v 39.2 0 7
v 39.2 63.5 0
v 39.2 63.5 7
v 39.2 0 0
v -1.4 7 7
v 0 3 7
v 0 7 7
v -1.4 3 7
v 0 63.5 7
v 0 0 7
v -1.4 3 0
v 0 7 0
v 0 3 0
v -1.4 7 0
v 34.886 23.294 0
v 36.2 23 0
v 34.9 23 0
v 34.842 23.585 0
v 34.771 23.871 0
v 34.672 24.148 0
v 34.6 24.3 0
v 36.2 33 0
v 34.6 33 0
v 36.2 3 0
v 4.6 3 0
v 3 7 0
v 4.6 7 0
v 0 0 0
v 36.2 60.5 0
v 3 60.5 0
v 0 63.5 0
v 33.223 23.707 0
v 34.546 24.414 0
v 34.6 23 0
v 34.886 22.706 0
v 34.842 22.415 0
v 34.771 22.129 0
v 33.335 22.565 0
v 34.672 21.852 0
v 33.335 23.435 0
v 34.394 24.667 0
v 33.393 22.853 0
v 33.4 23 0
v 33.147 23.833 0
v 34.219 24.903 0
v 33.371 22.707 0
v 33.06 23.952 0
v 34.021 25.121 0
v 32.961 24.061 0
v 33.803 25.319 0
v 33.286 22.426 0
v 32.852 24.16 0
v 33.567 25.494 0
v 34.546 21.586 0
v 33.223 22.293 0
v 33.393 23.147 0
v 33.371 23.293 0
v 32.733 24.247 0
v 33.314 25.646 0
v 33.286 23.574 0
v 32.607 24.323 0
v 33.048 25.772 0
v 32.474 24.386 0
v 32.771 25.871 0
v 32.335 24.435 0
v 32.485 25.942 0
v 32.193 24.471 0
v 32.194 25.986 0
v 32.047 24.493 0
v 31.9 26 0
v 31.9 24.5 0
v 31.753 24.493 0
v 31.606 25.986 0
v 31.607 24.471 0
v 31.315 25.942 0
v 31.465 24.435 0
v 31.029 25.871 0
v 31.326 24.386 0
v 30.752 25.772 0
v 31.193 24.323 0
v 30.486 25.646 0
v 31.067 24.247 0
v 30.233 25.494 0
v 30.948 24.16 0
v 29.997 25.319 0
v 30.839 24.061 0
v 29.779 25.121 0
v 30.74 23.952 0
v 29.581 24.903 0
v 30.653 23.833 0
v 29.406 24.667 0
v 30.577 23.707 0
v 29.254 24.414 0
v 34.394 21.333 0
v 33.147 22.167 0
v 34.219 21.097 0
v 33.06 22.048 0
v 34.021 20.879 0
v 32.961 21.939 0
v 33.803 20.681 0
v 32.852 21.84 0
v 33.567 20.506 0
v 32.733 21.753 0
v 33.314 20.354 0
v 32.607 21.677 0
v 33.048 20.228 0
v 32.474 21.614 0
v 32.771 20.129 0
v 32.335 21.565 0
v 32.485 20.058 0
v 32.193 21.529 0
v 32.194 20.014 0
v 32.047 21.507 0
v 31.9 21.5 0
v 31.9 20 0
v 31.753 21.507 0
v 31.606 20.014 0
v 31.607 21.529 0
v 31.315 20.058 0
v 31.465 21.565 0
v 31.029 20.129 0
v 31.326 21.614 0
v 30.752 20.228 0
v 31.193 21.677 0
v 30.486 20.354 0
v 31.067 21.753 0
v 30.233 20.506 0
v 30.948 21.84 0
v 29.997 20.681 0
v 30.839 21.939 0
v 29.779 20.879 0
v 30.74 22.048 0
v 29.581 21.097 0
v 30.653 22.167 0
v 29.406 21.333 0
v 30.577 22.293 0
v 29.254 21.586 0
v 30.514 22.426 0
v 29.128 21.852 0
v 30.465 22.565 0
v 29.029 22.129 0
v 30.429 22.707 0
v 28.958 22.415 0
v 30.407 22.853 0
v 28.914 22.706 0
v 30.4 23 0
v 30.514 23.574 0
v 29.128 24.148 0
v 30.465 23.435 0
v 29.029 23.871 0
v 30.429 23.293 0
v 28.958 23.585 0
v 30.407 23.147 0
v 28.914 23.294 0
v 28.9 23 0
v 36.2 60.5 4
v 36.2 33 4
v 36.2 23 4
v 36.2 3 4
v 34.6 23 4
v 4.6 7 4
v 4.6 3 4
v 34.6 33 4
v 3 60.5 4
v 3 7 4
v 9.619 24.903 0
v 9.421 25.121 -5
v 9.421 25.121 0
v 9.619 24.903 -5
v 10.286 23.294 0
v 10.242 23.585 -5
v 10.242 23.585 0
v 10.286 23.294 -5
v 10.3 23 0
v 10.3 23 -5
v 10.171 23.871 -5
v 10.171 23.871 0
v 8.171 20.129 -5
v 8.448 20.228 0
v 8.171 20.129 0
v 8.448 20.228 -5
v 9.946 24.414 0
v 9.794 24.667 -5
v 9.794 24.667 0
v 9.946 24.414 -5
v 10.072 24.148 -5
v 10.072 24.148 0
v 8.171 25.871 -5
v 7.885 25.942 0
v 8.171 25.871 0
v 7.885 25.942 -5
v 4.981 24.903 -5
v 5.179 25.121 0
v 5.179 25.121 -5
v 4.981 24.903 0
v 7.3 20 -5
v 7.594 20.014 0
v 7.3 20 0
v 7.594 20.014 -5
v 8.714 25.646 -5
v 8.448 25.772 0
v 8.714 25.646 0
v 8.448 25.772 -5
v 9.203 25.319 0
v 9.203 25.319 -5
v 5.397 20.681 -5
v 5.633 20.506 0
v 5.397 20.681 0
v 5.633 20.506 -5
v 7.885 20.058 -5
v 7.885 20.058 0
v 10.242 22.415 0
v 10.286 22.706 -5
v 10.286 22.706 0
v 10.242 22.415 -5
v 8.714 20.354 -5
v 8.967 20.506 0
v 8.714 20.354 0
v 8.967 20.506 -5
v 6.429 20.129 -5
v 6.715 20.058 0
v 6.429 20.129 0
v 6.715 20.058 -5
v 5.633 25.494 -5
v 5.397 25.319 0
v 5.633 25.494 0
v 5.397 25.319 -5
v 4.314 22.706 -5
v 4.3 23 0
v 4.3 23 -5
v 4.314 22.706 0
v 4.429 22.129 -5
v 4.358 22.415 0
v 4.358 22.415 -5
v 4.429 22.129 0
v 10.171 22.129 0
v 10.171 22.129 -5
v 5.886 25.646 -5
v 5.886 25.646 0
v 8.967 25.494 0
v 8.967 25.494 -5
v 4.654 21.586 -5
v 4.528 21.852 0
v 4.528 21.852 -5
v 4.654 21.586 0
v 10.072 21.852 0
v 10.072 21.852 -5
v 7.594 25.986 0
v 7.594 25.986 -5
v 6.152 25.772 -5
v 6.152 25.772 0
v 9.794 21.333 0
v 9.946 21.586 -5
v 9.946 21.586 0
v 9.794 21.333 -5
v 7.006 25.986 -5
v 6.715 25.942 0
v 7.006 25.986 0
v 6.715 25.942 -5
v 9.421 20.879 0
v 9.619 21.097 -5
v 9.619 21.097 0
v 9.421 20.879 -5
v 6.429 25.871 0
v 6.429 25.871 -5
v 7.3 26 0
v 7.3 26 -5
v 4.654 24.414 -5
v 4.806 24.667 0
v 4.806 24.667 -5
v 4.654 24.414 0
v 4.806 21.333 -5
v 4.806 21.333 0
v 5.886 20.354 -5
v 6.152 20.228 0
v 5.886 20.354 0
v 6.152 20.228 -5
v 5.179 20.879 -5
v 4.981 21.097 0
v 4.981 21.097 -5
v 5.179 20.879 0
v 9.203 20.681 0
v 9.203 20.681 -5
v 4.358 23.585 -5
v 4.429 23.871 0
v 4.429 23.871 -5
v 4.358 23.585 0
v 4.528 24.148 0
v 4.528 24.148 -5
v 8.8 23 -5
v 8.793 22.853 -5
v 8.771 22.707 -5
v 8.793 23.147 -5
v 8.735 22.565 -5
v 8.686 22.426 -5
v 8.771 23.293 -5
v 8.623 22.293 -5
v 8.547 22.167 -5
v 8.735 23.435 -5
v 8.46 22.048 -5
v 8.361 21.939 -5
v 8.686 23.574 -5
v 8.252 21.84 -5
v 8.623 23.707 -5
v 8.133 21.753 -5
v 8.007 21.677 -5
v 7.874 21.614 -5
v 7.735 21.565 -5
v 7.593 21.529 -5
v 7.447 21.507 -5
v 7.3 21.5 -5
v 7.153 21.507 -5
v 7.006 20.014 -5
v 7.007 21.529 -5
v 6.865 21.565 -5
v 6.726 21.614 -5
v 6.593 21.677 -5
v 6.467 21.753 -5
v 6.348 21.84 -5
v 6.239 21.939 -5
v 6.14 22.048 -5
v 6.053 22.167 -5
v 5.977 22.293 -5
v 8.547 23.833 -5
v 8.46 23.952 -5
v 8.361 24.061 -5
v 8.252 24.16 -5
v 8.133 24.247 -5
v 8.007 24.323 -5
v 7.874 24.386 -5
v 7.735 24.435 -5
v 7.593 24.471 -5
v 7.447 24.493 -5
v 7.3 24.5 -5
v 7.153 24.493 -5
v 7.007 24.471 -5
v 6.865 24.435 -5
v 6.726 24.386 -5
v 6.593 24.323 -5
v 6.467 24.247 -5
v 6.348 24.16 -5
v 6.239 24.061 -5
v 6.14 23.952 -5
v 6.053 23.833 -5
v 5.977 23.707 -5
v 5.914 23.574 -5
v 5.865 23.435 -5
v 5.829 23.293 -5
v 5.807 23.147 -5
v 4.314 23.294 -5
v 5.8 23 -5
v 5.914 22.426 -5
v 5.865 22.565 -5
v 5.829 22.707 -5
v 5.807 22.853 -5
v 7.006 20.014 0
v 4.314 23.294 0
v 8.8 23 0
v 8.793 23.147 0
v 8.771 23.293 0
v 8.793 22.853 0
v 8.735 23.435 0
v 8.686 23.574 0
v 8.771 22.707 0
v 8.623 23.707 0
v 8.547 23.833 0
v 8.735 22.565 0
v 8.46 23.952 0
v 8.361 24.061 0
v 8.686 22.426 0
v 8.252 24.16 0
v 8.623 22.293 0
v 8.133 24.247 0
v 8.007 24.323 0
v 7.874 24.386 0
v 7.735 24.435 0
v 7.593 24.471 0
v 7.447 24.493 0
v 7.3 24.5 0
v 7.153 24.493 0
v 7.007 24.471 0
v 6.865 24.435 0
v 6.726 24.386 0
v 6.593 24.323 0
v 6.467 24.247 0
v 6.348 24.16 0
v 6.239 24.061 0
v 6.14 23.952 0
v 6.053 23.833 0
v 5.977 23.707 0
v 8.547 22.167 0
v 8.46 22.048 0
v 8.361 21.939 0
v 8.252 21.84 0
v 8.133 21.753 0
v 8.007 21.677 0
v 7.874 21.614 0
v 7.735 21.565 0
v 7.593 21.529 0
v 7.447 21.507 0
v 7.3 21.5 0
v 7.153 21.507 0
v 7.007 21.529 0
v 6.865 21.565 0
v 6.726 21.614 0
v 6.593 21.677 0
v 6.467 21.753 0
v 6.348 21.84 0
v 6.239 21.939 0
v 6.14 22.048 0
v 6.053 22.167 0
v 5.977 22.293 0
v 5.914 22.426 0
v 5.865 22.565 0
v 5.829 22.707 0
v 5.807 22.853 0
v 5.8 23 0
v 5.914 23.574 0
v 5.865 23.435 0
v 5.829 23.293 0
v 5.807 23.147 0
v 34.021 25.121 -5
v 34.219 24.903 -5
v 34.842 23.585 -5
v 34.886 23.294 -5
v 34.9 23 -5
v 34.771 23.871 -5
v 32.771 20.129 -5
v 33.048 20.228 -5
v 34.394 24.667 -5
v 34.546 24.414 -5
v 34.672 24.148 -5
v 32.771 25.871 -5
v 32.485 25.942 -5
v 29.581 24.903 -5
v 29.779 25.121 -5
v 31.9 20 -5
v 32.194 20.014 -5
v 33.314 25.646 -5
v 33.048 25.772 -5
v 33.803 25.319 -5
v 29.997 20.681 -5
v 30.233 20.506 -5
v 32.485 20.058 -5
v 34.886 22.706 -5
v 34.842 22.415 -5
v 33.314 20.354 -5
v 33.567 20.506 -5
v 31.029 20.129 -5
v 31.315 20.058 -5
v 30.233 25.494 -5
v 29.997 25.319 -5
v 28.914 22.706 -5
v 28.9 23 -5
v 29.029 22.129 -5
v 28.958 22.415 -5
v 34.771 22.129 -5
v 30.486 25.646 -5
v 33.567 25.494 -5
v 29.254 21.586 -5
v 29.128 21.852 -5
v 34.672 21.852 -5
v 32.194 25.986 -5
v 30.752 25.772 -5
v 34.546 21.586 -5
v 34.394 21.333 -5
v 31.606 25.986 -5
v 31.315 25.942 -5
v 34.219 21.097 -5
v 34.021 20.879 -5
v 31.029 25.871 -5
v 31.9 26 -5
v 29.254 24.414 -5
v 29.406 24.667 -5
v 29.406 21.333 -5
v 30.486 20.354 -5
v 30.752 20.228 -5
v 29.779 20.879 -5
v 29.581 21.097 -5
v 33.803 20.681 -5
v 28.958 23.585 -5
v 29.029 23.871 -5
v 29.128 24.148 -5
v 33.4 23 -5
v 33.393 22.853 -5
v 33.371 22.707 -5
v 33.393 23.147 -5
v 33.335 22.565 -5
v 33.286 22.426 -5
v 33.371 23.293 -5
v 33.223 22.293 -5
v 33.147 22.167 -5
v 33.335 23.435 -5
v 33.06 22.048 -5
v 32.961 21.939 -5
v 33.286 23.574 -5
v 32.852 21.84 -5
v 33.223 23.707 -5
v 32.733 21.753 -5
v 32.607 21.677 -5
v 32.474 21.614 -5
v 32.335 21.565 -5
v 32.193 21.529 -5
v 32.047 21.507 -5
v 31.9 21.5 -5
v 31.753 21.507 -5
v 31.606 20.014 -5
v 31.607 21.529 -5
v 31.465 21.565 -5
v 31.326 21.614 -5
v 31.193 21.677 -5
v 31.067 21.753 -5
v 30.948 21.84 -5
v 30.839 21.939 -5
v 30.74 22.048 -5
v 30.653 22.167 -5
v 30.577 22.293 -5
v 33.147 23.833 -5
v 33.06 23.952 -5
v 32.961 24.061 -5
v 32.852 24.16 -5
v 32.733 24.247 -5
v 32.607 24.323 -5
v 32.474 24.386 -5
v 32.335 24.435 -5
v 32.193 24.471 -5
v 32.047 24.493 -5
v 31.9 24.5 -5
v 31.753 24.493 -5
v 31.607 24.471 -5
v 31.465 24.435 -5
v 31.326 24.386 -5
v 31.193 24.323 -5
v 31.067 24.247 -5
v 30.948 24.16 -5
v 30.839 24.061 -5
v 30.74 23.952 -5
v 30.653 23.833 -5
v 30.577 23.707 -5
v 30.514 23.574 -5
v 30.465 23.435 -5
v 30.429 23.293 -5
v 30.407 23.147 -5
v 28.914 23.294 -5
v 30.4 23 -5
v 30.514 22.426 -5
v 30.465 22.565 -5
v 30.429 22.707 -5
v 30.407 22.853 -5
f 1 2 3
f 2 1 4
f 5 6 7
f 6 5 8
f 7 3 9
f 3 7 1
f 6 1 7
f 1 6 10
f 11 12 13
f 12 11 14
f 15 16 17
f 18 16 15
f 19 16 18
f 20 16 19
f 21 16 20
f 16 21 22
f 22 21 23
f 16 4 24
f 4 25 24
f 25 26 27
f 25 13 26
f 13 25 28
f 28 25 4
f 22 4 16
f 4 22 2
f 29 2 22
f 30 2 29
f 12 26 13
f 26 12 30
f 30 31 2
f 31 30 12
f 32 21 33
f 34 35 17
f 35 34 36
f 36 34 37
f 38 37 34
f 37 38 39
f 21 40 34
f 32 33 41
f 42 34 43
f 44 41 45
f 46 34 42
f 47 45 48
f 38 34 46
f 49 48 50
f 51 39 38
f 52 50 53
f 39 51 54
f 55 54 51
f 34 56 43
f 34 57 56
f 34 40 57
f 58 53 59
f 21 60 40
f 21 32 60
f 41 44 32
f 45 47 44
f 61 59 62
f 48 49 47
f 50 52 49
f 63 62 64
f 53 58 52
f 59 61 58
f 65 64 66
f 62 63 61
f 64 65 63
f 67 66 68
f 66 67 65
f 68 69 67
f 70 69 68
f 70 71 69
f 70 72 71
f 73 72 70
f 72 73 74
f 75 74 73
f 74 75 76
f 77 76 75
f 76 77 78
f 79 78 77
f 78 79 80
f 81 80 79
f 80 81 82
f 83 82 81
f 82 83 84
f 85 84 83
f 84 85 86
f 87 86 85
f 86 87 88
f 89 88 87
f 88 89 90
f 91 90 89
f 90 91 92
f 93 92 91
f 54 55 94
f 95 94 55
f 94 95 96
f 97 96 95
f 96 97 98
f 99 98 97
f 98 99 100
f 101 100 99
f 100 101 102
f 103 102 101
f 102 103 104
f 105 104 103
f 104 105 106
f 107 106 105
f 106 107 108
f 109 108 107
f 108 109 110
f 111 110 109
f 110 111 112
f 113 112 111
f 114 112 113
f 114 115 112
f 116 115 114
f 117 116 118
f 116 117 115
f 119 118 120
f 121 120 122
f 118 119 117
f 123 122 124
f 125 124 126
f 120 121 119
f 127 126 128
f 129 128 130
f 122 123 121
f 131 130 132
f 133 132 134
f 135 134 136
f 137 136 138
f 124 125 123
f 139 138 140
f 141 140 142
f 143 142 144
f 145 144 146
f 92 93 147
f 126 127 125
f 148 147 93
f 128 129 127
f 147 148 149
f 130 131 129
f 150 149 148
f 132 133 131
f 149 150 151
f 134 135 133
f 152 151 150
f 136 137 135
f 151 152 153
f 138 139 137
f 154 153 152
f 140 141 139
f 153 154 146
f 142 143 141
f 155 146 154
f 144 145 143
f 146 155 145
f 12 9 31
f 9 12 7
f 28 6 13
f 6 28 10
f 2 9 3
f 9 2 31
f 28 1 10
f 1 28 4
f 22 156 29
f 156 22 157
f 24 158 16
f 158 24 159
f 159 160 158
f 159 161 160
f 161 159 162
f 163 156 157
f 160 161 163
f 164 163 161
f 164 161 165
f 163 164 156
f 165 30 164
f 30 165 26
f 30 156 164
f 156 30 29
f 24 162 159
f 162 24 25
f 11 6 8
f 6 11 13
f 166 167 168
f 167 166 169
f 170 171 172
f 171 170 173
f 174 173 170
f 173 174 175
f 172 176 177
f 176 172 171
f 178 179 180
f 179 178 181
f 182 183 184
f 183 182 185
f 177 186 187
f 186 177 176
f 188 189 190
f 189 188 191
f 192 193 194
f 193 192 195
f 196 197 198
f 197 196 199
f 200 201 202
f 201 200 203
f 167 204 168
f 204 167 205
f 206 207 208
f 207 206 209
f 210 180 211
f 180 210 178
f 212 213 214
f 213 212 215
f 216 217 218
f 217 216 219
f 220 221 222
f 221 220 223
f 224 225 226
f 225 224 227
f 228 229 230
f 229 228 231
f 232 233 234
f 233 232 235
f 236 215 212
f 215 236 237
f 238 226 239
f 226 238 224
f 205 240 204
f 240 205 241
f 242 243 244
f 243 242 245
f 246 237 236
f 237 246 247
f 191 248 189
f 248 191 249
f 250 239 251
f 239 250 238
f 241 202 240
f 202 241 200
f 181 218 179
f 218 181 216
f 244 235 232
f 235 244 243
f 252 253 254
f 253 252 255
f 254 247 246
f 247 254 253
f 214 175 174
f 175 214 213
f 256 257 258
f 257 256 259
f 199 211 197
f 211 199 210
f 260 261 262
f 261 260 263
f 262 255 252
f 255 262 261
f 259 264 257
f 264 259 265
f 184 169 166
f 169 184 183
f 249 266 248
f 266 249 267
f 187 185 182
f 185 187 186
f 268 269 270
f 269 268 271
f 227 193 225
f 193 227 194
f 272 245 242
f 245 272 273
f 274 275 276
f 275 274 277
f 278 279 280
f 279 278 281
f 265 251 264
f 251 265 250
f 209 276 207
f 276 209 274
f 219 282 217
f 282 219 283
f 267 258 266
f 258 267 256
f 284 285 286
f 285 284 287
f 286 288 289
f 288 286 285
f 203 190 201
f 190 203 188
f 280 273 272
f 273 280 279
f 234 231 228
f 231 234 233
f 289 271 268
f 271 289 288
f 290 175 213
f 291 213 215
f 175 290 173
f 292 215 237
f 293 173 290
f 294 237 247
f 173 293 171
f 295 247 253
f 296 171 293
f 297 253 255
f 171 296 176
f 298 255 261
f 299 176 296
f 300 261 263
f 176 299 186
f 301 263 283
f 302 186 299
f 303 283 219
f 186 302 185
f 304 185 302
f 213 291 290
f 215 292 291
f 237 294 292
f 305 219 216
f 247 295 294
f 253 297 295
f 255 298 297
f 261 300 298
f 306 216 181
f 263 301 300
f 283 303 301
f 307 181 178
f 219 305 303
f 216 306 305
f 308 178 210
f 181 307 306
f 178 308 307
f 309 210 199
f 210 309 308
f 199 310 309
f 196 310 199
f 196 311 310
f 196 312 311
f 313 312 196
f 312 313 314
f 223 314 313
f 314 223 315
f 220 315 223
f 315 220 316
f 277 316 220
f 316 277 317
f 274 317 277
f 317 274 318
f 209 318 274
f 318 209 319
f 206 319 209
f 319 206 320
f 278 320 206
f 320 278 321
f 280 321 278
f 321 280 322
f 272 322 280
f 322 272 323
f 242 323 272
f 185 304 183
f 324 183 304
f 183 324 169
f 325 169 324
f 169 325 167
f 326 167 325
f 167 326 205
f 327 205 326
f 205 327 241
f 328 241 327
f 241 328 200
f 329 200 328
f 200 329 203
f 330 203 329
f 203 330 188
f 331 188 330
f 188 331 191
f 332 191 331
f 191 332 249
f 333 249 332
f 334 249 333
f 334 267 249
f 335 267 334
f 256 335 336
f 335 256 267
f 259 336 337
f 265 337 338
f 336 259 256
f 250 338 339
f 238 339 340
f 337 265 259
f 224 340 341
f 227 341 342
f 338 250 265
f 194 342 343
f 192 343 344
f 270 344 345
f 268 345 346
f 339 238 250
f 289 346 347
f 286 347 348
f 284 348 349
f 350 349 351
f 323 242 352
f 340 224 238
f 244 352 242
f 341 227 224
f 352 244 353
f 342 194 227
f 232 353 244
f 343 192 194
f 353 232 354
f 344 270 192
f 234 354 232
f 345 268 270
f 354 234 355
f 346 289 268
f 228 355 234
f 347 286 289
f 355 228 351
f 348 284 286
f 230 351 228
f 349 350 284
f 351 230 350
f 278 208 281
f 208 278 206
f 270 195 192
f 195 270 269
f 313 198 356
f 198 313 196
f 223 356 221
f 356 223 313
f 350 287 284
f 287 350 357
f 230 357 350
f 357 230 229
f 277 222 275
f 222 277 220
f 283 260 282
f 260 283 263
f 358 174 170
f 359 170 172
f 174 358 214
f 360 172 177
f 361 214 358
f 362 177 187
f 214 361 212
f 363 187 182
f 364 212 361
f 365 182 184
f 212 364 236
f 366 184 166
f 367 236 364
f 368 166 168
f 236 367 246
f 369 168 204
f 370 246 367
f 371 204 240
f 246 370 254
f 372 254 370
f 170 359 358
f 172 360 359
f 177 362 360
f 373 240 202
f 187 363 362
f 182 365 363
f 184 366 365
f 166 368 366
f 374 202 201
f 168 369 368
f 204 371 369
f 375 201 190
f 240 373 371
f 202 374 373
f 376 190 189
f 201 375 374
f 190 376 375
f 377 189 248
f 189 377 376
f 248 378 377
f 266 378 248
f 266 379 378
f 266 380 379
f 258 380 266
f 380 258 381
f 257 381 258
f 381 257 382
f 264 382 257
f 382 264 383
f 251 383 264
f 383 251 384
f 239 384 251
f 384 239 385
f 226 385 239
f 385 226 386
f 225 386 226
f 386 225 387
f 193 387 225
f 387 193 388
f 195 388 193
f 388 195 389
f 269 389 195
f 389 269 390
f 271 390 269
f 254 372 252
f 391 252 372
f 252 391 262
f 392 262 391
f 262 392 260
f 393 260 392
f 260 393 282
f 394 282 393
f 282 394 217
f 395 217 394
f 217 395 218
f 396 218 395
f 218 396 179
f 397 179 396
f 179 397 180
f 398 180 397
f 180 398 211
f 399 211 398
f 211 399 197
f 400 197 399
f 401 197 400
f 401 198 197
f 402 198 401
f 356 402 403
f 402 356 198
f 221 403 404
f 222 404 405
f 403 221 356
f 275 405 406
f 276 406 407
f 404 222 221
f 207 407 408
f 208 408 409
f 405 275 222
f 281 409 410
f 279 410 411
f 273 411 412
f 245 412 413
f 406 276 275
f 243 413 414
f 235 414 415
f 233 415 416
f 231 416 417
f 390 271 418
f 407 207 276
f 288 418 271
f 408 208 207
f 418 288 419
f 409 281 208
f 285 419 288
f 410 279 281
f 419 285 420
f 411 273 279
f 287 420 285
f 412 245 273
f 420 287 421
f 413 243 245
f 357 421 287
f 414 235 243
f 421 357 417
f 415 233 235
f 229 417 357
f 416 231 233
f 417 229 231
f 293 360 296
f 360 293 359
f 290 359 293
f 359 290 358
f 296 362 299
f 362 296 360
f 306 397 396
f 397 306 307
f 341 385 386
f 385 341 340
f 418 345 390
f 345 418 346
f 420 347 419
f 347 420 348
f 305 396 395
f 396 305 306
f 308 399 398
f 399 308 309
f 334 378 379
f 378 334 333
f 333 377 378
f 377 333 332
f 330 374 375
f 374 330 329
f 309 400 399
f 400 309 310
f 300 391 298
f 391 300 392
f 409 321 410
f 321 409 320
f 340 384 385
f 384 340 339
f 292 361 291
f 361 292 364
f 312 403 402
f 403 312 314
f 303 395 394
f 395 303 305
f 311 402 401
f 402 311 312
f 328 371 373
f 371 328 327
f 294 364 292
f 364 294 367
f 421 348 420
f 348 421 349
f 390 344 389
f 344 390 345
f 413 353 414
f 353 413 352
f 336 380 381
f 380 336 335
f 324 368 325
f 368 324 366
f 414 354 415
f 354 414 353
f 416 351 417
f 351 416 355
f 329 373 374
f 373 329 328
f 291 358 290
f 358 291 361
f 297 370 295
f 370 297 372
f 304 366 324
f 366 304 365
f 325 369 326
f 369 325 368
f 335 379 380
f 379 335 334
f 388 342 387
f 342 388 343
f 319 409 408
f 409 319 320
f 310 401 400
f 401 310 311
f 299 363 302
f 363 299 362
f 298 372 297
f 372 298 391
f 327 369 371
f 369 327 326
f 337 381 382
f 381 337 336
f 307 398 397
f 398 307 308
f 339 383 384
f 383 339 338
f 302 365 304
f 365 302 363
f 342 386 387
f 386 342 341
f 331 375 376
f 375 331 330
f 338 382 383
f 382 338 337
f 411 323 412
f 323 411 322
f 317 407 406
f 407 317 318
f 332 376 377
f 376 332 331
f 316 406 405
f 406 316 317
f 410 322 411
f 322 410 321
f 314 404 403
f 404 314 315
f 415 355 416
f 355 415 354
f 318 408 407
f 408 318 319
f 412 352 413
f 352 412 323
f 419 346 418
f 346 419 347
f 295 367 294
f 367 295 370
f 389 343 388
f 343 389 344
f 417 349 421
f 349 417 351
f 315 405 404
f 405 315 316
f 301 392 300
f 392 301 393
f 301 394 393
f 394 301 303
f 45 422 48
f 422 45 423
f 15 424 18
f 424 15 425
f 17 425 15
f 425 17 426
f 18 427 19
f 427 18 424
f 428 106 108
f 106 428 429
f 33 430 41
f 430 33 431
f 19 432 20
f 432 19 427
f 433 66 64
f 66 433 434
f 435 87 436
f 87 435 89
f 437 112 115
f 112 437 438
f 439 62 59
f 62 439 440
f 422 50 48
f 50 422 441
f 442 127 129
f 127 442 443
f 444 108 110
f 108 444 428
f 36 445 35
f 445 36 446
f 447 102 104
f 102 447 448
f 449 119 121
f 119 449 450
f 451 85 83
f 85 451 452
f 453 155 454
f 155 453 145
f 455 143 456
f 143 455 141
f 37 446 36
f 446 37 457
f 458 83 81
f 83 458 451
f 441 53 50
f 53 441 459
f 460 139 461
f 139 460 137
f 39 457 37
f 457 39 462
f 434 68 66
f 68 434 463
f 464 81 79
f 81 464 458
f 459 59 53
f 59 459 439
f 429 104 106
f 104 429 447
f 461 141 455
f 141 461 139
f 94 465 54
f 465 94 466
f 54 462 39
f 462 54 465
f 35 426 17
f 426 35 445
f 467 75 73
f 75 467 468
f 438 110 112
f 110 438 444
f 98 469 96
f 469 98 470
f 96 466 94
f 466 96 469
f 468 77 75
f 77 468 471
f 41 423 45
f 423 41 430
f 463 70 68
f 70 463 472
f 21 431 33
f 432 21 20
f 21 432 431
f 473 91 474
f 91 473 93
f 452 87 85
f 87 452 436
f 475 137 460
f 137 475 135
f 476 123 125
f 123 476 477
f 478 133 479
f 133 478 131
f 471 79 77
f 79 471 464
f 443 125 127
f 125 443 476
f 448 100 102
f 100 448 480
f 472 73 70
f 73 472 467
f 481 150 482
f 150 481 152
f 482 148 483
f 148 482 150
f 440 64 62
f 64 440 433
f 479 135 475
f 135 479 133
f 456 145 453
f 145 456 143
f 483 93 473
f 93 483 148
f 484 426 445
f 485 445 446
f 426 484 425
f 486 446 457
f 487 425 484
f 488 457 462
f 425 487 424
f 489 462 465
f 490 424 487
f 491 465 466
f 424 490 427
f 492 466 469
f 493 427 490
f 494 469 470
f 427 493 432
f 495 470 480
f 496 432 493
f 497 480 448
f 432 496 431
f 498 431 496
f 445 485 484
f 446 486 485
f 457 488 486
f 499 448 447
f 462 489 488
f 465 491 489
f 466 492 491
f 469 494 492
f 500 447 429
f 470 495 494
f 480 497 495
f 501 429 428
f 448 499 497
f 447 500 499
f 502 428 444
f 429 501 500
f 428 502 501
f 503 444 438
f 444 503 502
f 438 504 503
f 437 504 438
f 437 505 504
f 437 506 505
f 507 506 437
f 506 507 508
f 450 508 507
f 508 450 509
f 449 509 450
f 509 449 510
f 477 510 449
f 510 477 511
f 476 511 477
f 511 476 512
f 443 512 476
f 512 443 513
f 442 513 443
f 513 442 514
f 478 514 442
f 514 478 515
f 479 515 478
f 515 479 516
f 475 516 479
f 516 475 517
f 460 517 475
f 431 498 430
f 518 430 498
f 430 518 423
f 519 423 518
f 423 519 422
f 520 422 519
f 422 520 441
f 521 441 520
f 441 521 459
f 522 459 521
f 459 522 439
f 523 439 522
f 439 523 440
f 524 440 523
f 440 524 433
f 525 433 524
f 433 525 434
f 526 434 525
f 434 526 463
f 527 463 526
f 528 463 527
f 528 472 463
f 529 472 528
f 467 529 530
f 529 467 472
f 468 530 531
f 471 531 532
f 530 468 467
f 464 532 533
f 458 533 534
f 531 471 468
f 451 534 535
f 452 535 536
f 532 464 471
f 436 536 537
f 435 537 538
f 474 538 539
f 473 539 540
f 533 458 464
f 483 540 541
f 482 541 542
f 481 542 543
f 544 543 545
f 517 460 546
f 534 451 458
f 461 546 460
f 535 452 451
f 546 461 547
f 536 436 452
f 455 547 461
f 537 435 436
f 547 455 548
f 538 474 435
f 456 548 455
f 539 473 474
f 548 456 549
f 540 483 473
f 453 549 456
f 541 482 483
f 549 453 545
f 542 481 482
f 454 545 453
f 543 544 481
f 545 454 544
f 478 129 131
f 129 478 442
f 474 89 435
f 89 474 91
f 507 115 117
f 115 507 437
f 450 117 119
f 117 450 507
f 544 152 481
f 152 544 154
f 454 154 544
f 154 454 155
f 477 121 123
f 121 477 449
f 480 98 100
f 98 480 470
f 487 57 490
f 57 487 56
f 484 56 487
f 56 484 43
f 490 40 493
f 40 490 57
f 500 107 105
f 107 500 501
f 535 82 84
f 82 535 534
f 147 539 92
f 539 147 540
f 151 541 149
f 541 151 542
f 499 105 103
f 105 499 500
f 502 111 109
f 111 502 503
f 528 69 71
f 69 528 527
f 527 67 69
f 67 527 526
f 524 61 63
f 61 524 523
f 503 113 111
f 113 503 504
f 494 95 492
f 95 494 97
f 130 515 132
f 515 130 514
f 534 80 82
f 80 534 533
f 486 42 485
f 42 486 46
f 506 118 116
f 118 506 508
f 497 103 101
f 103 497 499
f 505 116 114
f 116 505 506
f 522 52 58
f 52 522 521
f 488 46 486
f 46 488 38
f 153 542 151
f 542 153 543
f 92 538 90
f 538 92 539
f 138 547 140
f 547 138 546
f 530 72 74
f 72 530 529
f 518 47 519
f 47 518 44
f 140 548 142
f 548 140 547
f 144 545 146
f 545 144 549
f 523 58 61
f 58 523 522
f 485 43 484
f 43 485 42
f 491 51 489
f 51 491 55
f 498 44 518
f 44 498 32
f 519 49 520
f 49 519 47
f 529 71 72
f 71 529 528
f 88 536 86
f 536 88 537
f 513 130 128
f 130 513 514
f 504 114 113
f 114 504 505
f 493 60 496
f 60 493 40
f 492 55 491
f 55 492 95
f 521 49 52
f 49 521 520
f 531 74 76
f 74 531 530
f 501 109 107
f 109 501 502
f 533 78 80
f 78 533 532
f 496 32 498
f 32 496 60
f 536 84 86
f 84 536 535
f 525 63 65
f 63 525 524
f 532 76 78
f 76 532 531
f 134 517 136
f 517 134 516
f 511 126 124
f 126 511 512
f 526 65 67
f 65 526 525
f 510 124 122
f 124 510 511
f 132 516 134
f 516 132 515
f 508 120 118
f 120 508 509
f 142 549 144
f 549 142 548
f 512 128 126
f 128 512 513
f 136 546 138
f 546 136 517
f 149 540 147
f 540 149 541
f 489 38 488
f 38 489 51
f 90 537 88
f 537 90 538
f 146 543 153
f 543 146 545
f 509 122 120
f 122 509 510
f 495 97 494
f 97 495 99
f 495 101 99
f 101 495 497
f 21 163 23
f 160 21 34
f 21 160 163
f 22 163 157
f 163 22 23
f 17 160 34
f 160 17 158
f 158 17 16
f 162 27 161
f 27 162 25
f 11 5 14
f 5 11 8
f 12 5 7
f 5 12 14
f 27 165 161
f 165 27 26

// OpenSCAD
$fn = 64;

// Overall plate dimensions
plate_width = 39.2;
plate_height = 63.5;
plate_thickness = 7;

// Recessed area on the back of the plate
inset_depth = 4;
ridge = 3;

// Circular reference used for additional ridges
circle_d = 30;
circle_center_y = 28;

// Ridge details
right_ridge_height = 10;      // length of ridge joining circle to right wall
bl_ridge_size = [6, 4];       // [width, height] of bottom-left ridge

// Screw post parameters
post_spacing = 24.6;        // distance between hole centres
post_center_height = 23;    // distance from bottom of plate to hole centres
post_height = 5;            // how far the new posts extend
post_outer_d = 6;           // outer diameter of the post
post_hole_d = 3;            // diameter of screw hole

module base_plate() {
    difference() {
        // full plate
        cube([plate_width, plate_height, plate_thickness], center=false);

        // recessed interior
        translate([ridge, ridge, 0])
            cube([plate_width - 2*ridge, plate_height - 2*ridge, inset_depth], center=false);
    }
}

module screw_post() {
    difference() {
        translate([0,0,-post_height])
            cylinder(h = post_height, d = post_outer_d, center=false);
        translate([0,0,-post_height-1])
            cylinder(h = post_height + 2, d = post_hole_d, center=false);
    }
}

module posts() {
    for (x = [-post_spacing/2, post_spacing/2])
        translate([plate_width/2 + x, post_center_height, 0])
            screw_post();
}

module right_ridge() {
    ridge_width = plate_width/2 - ridge - circle_d/2;
    translate([plate_width/2 + circle_d/2, circle_center_y - right_ridge_height/2, 0])
        cube([ridge_width, right_ridge_height, plate_thickness], center=false);
}

module bottom_left_ridge() {
    translate([plate_width/2 - circle_d/2 - bl_ridge_size[0], ridge, 0])
        cube([bl_ridge_size[0], bl_ridge_size[1], plate_thickness], center=false);
}

union() {
    base_plate();
    right_ridge();
    bottom_left_ridge();
    posts();
}
